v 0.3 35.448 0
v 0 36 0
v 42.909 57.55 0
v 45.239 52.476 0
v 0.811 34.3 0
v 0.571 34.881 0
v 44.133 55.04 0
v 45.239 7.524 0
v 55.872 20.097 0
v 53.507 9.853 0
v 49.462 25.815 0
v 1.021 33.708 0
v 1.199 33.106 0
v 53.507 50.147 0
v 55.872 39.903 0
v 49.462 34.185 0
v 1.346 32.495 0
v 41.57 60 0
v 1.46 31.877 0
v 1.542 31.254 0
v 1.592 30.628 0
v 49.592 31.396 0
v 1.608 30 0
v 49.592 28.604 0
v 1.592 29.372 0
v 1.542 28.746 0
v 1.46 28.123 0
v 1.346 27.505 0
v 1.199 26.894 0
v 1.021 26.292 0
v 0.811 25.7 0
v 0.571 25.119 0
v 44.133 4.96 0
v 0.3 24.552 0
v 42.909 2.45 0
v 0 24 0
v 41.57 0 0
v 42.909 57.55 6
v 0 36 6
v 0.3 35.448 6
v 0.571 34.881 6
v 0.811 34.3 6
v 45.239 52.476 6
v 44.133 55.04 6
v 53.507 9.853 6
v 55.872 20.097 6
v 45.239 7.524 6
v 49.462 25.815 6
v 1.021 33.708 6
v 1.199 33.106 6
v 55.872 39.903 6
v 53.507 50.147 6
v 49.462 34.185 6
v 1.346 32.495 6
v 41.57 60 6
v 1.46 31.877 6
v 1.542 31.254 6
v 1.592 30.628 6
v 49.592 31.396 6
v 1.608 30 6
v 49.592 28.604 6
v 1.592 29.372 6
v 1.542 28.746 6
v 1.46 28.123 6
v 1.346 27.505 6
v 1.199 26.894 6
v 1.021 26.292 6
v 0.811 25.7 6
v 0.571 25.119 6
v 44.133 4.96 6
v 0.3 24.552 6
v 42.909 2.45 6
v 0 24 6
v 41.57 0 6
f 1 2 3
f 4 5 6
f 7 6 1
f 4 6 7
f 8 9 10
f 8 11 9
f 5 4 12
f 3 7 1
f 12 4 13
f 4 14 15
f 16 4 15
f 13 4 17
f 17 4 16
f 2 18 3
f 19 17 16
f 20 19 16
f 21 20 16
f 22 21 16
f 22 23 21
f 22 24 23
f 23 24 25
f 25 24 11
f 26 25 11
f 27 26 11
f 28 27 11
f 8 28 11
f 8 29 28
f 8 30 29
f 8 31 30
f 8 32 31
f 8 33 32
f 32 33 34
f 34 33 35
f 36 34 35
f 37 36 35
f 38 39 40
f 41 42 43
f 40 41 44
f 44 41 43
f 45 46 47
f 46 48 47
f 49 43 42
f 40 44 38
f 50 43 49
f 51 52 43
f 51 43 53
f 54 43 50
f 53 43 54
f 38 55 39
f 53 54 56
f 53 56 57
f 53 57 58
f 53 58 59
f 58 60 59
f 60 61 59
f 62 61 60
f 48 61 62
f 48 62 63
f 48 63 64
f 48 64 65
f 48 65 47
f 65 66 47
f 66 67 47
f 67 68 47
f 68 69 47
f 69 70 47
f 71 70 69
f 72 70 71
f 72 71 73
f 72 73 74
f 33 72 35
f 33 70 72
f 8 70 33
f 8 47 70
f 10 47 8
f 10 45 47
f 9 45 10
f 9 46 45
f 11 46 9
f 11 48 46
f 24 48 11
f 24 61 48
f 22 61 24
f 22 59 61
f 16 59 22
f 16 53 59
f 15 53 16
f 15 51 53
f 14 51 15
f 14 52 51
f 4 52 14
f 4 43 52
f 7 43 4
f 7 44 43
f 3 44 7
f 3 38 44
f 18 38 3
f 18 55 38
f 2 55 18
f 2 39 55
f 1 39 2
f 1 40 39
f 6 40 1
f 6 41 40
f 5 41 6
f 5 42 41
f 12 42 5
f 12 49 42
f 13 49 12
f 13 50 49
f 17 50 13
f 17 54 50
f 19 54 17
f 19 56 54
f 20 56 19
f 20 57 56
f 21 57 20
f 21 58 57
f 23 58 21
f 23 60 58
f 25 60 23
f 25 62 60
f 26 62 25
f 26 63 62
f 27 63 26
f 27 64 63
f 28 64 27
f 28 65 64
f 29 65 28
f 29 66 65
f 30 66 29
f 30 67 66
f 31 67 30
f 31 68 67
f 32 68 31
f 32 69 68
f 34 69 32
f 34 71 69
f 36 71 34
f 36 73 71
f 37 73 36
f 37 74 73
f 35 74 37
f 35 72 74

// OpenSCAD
$fn = 32;

// ----------------------------------------------------------------------
// Gear sector: 2 teeth on 60 degrees
// ----------------------------------------------------------------------

// --- parameters (mm) ---
sector_angle = 60;        // sector angle, degrees
root_r = 60;              // root circle radius
tooth_h = 7;              // tooth height over the root circle
teeth = 2;                // number of teeth on the sector
hub_r = 12;               // hub bore radius
plate_t = 6;              // sector thickness, Z
arc_step = 3;             // sampling step of the root/hub arcs, degrees

tip_r = root_r + tooth_h;  // tip circle radius

profile = [[41.57, 0], [42.909, 2.45], [44.133, 4.96], [45.239, 7.524], [53.507, 9.853], [55.872, 20.097], [49.462, 25.815], [49.592, 28.604], [49.592, 31.396], [49.462, 34.185], [55.872, 39.903], [53.507, 50.147], [45.239, 52.476], [44.133, 55.04], [42.909, 57.55], [41.57, 60], [0, 36], [0.3, 35.448], [0.571, 34.881], [0.811, 34.3], [1.021, 33.708], [1.199, 33.106], [1.346, 32.495], [1.46, 31.877], [1.542, 31.254], [1.592, 30.628], [1.608, 30], [1.592, 29.372], [1.542, 28.746], [1.46, 28.123], [1.346, 27.505], [1.199, 26.894], [1.021, 26.292], [0.811, 25.7], [0.571, 25.119], [0.3, 24.552], [0, 24]];  // primary outline, 37 points, counter clockwise

// --- the one profile operation ---
linear_extrude(height = plate_t) polygon(points = profile);
